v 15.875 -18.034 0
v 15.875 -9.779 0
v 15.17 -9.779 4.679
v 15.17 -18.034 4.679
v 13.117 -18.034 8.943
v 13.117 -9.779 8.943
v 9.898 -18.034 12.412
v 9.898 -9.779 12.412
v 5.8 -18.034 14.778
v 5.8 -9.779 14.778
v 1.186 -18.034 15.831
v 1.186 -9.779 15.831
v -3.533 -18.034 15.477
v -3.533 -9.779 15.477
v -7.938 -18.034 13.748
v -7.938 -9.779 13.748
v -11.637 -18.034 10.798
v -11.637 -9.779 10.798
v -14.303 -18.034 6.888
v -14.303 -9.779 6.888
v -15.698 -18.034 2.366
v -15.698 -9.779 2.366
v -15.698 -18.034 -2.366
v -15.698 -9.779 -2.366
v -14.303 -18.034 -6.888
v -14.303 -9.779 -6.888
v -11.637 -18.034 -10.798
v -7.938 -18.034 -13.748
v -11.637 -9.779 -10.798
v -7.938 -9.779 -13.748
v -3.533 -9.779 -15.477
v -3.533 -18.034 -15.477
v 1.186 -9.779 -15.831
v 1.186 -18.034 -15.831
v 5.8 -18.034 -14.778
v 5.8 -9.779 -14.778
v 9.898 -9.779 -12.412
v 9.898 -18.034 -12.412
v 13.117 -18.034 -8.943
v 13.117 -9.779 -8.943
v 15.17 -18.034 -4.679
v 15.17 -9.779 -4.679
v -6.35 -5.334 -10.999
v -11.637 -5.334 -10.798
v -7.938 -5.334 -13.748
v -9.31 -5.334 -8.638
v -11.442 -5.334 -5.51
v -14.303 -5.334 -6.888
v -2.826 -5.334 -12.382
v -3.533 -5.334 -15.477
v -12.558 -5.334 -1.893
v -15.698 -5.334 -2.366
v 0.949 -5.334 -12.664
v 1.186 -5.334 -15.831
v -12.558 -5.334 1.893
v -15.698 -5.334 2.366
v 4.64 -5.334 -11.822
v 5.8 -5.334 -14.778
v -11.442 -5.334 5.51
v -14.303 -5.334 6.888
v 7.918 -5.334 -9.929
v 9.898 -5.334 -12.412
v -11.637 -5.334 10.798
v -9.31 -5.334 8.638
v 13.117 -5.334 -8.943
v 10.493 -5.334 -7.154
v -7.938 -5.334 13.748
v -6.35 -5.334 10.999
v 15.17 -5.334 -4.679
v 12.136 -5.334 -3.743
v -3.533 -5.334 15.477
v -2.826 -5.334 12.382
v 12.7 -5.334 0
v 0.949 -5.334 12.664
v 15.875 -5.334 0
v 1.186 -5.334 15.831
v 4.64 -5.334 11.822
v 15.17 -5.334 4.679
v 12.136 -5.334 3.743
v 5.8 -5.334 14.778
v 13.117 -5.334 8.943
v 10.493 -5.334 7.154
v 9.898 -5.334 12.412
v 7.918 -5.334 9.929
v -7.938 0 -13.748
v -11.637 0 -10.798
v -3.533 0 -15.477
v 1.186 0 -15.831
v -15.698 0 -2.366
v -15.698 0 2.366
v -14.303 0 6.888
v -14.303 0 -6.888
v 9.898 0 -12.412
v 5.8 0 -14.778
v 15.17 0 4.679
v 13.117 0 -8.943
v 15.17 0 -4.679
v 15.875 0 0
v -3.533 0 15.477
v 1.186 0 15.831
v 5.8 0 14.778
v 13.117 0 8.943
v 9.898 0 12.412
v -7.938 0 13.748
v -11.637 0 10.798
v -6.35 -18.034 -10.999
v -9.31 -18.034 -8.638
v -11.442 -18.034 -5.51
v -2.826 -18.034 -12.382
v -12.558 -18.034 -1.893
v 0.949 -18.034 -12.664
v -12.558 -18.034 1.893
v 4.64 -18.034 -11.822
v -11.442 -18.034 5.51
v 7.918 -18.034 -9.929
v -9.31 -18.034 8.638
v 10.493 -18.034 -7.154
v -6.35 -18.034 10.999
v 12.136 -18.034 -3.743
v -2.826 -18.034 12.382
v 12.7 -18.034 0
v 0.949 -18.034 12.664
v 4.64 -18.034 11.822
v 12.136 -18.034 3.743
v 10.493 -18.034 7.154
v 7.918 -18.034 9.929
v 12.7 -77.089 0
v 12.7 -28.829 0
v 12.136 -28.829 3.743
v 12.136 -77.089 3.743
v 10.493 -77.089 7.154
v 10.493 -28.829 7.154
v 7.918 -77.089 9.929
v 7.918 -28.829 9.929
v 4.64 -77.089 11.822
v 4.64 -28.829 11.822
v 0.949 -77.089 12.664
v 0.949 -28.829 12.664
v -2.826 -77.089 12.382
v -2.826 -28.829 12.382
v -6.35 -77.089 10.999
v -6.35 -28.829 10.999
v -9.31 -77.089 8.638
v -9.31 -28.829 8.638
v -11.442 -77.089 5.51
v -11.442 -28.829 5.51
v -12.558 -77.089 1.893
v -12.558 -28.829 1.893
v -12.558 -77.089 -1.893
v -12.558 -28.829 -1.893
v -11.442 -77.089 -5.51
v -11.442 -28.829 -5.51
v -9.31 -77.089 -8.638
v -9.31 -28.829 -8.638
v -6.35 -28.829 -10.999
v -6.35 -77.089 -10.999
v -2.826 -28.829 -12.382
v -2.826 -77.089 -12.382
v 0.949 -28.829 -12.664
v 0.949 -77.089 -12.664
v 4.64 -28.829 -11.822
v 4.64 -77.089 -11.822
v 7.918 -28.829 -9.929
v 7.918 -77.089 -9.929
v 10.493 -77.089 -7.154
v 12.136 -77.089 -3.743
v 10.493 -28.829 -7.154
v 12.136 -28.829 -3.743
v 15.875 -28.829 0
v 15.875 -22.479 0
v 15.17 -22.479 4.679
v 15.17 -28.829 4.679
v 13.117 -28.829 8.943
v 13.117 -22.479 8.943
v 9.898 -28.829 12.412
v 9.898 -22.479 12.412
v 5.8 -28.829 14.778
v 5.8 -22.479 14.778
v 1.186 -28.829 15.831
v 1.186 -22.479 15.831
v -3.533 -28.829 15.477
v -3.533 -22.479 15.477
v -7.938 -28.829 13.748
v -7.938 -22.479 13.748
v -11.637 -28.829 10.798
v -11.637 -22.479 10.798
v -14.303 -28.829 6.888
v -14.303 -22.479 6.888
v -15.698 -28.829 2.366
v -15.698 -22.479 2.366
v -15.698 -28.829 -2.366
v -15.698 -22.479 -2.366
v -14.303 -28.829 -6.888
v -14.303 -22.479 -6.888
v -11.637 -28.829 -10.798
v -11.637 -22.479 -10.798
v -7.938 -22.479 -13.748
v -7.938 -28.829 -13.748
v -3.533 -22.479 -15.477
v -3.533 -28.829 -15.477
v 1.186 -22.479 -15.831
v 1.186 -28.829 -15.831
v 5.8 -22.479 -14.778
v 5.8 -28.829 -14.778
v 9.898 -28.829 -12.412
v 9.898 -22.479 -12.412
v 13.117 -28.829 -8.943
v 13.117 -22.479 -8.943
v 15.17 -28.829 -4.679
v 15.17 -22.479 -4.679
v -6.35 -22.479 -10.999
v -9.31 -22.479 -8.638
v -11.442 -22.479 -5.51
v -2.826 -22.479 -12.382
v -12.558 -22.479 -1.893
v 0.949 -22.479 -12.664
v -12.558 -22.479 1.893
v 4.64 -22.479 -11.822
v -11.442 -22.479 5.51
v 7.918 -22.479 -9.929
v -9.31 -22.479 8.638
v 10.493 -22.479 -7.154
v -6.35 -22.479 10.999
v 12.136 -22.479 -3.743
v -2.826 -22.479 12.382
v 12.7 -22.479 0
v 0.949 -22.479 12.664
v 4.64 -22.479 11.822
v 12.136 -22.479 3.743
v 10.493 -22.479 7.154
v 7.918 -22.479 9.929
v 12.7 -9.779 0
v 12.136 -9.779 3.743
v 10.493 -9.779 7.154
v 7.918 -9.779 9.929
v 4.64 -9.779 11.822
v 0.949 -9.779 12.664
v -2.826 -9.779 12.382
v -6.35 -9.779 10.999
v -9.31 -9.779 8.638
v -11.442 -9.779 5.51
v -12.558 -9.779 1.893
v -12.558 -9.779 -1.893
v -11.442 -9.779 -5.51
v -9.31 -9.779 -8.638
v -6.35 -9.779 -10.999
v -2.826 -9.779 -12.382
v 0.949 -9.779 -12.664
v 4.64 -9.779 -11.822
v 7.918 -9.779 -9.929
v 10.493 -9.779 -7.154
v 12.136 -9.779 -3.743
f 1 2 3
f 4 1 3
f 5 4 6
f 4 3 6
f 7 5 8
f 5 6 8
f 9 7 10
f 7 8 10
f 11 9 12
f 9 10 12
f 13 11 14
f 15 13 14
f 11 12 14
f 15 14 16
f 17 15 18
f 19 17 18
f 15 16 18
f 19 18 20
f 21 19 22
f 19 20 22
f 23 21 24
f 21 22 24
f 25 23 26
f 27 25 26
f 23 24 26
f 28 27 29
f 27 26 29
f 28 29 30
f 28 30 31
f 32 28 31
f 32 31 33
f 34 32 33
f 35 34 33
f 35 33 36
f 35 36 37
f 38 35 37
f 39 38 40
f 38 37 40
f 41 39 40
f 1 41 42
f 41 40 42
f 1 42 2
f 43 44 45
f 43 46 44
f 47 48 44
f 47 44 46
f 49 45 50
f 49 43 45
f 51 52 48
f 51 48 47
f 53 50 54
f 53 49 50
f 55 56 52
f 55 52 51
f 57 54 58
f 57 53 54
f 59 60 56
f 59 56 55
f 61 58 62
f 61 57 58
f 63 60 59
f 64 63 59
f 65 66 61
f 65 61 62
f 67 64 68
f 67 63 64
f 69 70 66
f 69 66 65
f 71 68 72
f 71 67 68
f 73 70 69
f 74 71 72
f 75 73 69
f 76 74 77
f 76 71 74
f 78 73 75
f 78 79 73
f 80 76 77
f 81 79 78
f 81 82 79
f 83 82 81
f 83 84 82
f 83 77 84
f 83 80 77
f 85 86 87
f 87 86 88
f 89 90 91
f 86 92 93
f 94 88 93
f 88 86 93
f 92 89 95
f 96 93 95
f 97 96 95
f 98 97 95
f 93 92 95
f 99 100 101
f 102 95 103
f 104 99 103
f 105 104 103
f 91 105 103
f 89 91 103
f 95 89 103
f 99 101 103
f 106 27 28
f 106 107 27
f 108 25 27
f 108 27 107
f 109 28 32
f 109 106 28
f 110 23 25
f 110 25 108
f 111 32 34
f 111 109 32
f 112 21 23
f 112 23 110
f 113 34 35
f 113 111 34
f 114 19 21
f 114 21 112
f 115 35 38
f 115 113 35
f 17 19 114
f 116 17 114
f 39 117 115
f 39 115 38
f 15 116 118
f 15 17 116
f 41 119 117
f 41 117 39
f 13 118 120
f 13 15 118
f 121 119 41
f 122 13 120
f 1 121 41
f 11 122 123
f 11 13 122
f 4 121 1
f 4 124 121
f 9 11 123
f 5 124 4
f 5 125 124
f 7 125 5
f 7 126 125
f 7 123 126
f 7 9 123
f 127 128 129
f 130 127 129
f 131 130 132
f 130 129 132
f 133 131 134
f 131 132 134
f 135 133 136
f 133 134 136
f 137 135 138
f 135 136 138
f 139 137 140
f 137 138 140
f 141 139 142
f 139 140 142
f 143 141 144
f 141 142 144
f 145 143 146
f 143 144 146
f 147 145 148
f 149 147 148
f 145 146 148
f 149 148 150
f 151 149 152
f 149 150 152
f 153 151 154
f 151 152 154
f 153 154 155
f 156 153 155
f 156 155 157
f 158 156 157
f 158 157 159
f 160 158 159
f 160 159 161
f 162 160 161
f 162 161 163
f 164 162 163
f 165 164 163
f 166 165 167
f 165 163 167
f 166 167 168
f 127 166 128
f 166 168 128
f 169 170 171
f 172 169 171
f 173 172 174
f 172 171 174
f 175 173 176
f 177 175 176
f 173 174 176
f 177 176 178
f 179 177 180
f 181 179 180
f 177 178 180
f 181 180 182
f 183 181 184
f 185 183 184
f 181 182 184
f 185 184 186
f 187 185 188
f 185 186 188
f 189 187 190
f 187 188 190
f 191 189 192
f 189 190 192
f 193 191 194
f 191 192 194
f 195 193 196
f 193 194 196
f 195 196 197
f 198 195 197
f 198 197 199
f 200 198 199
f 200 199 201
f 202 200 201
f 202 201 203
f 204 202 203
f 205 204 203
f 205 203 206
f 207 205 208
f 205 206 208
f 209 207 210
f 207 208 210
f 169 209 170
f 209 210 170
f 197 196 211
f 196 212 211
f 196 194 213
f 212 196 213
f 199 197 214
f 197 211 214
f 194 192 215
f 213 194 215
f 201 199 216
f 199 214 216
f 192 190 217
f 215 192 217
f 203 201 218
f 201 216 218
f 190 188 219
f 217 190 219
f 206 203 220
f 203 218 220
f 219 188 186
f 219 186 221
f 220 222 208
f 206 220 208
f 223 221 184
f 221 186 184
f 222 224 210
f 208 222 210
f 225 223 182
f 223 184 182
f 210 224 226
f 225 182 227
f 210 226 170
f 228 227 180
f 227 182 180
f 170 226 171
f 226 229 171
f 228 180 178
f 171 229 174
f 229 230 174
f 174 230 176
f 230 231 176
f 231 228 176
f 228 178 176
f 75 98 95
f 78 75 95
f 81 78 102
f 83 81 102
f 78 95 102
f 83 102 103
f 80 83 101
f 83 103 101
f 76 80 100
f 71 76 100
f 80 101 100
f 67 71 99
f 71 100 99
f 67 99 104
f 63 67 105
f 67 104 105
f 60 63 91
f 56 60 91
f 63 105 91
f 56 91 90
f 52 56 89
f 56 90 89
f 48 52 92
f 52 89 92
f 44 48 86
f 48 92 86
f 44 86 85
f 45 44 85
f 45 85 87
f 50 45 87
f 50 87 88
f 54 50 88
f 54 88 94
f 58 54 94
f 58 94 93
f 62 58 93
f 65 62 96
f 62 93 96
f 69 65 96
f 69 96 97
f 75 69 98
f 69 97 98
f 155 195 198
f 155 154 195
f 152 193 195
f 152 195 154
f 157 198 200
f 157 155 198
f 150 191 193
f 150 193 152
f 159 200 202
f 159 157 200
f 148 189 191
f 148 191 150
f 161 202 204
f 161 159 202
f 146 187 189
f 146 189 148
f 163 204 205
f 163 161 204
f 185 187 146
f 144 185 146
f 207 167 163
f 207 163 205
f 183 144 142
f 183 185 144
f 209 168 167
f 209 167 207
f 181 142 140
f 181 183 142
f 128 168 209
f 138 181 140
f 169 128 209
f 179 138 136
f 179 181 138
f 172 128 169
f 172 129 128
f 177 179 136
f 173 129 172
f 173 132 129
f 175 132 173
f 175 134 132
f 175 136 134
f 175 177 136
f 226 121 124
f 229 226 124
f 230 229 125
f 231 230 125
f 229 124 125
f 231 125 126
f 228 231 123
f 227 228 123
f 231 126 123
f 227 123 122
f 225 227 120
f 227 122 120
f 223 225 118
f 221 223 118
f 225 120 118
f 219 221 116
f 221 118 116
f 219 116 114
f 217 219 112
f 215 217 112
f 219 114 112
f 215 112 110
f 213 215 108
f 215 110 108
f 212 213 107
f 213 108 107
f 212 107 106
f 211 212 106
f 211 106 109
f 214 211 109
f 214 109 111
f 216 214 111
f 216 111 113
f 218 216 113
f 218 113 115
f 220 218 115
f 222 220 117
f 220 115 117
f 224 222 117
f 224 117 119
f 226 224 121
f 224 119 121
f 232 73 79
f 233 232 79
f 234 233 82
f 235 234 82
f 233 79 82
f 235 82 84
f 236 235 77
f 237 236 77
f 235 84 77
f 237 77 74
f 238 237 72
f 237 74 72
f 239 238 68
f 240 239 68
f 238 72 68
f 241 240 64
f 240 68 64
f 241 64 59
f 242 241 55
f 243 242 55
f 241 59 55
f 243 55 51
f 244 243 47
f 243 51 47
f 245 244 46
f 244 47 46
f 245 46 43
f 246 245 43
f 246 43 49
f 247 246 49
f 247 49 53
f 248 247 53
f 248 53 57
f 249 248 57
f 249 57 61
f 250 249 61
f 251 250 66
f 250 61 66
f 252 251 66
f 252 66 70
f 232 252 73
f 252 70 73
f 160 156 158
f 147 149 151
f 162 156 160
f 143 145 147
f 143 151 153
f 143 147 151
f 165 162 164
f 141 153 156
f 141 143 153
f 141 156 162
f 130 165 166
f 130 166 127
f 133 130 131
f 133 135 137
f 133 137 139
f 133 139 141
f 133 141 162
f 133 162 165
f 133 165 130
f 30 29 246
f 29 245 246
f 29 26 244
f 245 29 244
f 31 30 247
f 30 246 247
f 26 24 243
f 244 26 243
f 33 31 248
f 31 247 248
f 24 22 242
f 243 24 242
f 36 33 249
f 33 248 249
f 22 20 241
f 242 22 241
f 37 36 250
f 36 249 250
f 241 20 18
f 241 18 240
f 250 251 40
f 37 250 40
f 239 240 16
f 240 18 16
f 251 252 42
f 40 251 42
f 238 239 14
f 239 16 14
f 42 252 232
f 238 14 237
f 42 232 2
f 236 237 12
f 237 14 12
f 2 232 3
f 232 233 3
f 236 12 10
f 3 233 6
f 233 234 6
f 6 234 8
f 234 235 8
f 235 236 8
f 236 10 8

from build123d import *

# Parameters (mm, degrees)
F0_R      = 15.875
F1_DEPTH  = 5.334
F2_R      = 12.7
F3_DEPTH  = 4.445
F4_R      = 15.875
F5_DEPTH  = 8.255
F6_R      = 12.7
F7_DEPTH  = 4.445
F8_R      = 15.875
F9_DEPTH  = 6.35
F10_R     = 12.7
F11_DEPTH = 48.26


with BuildPart() as f1:
    # F0 (on Front) → F1 (new body)
    with BuildSketch(Plane.XZ):
        Circle(F0_R)
    extrude(amount=F1_DEPTH)

    # F2 (on face) → F3 (join)
    with BuildSketch(Plane.XZ.offset(5.334)):
        Circle(F2_R)
    extrude(amount=F3_DEPTH)

    # F4 (on face) → F5 (join)
    with BuildSketch(Plane.XZ.offset(9.779)):
        Circle(F4_R)
    extrude(amount=F5_DEPTH)

    # F6 (on face) → F7 (join)
    with BuildSketch(Plane.XZ.offset(18.034)):
        Circle(F6_R)
    extrude(amount=F7_DEPTH)

    # F8 (on face) → F9 (join)
    with BuildSketch(Plane.XZ.offset(22.479)):
        Circle(F8_R)
    extrude(amount=F9_DEPTH)

    # F10 (on face) → F11 (join)
    with BuildSketch(Plane.XZ.offset(28.829)):
        Circle(F10_R)
    extrude(amount=F11_DEPTH)


solid = f1.part
